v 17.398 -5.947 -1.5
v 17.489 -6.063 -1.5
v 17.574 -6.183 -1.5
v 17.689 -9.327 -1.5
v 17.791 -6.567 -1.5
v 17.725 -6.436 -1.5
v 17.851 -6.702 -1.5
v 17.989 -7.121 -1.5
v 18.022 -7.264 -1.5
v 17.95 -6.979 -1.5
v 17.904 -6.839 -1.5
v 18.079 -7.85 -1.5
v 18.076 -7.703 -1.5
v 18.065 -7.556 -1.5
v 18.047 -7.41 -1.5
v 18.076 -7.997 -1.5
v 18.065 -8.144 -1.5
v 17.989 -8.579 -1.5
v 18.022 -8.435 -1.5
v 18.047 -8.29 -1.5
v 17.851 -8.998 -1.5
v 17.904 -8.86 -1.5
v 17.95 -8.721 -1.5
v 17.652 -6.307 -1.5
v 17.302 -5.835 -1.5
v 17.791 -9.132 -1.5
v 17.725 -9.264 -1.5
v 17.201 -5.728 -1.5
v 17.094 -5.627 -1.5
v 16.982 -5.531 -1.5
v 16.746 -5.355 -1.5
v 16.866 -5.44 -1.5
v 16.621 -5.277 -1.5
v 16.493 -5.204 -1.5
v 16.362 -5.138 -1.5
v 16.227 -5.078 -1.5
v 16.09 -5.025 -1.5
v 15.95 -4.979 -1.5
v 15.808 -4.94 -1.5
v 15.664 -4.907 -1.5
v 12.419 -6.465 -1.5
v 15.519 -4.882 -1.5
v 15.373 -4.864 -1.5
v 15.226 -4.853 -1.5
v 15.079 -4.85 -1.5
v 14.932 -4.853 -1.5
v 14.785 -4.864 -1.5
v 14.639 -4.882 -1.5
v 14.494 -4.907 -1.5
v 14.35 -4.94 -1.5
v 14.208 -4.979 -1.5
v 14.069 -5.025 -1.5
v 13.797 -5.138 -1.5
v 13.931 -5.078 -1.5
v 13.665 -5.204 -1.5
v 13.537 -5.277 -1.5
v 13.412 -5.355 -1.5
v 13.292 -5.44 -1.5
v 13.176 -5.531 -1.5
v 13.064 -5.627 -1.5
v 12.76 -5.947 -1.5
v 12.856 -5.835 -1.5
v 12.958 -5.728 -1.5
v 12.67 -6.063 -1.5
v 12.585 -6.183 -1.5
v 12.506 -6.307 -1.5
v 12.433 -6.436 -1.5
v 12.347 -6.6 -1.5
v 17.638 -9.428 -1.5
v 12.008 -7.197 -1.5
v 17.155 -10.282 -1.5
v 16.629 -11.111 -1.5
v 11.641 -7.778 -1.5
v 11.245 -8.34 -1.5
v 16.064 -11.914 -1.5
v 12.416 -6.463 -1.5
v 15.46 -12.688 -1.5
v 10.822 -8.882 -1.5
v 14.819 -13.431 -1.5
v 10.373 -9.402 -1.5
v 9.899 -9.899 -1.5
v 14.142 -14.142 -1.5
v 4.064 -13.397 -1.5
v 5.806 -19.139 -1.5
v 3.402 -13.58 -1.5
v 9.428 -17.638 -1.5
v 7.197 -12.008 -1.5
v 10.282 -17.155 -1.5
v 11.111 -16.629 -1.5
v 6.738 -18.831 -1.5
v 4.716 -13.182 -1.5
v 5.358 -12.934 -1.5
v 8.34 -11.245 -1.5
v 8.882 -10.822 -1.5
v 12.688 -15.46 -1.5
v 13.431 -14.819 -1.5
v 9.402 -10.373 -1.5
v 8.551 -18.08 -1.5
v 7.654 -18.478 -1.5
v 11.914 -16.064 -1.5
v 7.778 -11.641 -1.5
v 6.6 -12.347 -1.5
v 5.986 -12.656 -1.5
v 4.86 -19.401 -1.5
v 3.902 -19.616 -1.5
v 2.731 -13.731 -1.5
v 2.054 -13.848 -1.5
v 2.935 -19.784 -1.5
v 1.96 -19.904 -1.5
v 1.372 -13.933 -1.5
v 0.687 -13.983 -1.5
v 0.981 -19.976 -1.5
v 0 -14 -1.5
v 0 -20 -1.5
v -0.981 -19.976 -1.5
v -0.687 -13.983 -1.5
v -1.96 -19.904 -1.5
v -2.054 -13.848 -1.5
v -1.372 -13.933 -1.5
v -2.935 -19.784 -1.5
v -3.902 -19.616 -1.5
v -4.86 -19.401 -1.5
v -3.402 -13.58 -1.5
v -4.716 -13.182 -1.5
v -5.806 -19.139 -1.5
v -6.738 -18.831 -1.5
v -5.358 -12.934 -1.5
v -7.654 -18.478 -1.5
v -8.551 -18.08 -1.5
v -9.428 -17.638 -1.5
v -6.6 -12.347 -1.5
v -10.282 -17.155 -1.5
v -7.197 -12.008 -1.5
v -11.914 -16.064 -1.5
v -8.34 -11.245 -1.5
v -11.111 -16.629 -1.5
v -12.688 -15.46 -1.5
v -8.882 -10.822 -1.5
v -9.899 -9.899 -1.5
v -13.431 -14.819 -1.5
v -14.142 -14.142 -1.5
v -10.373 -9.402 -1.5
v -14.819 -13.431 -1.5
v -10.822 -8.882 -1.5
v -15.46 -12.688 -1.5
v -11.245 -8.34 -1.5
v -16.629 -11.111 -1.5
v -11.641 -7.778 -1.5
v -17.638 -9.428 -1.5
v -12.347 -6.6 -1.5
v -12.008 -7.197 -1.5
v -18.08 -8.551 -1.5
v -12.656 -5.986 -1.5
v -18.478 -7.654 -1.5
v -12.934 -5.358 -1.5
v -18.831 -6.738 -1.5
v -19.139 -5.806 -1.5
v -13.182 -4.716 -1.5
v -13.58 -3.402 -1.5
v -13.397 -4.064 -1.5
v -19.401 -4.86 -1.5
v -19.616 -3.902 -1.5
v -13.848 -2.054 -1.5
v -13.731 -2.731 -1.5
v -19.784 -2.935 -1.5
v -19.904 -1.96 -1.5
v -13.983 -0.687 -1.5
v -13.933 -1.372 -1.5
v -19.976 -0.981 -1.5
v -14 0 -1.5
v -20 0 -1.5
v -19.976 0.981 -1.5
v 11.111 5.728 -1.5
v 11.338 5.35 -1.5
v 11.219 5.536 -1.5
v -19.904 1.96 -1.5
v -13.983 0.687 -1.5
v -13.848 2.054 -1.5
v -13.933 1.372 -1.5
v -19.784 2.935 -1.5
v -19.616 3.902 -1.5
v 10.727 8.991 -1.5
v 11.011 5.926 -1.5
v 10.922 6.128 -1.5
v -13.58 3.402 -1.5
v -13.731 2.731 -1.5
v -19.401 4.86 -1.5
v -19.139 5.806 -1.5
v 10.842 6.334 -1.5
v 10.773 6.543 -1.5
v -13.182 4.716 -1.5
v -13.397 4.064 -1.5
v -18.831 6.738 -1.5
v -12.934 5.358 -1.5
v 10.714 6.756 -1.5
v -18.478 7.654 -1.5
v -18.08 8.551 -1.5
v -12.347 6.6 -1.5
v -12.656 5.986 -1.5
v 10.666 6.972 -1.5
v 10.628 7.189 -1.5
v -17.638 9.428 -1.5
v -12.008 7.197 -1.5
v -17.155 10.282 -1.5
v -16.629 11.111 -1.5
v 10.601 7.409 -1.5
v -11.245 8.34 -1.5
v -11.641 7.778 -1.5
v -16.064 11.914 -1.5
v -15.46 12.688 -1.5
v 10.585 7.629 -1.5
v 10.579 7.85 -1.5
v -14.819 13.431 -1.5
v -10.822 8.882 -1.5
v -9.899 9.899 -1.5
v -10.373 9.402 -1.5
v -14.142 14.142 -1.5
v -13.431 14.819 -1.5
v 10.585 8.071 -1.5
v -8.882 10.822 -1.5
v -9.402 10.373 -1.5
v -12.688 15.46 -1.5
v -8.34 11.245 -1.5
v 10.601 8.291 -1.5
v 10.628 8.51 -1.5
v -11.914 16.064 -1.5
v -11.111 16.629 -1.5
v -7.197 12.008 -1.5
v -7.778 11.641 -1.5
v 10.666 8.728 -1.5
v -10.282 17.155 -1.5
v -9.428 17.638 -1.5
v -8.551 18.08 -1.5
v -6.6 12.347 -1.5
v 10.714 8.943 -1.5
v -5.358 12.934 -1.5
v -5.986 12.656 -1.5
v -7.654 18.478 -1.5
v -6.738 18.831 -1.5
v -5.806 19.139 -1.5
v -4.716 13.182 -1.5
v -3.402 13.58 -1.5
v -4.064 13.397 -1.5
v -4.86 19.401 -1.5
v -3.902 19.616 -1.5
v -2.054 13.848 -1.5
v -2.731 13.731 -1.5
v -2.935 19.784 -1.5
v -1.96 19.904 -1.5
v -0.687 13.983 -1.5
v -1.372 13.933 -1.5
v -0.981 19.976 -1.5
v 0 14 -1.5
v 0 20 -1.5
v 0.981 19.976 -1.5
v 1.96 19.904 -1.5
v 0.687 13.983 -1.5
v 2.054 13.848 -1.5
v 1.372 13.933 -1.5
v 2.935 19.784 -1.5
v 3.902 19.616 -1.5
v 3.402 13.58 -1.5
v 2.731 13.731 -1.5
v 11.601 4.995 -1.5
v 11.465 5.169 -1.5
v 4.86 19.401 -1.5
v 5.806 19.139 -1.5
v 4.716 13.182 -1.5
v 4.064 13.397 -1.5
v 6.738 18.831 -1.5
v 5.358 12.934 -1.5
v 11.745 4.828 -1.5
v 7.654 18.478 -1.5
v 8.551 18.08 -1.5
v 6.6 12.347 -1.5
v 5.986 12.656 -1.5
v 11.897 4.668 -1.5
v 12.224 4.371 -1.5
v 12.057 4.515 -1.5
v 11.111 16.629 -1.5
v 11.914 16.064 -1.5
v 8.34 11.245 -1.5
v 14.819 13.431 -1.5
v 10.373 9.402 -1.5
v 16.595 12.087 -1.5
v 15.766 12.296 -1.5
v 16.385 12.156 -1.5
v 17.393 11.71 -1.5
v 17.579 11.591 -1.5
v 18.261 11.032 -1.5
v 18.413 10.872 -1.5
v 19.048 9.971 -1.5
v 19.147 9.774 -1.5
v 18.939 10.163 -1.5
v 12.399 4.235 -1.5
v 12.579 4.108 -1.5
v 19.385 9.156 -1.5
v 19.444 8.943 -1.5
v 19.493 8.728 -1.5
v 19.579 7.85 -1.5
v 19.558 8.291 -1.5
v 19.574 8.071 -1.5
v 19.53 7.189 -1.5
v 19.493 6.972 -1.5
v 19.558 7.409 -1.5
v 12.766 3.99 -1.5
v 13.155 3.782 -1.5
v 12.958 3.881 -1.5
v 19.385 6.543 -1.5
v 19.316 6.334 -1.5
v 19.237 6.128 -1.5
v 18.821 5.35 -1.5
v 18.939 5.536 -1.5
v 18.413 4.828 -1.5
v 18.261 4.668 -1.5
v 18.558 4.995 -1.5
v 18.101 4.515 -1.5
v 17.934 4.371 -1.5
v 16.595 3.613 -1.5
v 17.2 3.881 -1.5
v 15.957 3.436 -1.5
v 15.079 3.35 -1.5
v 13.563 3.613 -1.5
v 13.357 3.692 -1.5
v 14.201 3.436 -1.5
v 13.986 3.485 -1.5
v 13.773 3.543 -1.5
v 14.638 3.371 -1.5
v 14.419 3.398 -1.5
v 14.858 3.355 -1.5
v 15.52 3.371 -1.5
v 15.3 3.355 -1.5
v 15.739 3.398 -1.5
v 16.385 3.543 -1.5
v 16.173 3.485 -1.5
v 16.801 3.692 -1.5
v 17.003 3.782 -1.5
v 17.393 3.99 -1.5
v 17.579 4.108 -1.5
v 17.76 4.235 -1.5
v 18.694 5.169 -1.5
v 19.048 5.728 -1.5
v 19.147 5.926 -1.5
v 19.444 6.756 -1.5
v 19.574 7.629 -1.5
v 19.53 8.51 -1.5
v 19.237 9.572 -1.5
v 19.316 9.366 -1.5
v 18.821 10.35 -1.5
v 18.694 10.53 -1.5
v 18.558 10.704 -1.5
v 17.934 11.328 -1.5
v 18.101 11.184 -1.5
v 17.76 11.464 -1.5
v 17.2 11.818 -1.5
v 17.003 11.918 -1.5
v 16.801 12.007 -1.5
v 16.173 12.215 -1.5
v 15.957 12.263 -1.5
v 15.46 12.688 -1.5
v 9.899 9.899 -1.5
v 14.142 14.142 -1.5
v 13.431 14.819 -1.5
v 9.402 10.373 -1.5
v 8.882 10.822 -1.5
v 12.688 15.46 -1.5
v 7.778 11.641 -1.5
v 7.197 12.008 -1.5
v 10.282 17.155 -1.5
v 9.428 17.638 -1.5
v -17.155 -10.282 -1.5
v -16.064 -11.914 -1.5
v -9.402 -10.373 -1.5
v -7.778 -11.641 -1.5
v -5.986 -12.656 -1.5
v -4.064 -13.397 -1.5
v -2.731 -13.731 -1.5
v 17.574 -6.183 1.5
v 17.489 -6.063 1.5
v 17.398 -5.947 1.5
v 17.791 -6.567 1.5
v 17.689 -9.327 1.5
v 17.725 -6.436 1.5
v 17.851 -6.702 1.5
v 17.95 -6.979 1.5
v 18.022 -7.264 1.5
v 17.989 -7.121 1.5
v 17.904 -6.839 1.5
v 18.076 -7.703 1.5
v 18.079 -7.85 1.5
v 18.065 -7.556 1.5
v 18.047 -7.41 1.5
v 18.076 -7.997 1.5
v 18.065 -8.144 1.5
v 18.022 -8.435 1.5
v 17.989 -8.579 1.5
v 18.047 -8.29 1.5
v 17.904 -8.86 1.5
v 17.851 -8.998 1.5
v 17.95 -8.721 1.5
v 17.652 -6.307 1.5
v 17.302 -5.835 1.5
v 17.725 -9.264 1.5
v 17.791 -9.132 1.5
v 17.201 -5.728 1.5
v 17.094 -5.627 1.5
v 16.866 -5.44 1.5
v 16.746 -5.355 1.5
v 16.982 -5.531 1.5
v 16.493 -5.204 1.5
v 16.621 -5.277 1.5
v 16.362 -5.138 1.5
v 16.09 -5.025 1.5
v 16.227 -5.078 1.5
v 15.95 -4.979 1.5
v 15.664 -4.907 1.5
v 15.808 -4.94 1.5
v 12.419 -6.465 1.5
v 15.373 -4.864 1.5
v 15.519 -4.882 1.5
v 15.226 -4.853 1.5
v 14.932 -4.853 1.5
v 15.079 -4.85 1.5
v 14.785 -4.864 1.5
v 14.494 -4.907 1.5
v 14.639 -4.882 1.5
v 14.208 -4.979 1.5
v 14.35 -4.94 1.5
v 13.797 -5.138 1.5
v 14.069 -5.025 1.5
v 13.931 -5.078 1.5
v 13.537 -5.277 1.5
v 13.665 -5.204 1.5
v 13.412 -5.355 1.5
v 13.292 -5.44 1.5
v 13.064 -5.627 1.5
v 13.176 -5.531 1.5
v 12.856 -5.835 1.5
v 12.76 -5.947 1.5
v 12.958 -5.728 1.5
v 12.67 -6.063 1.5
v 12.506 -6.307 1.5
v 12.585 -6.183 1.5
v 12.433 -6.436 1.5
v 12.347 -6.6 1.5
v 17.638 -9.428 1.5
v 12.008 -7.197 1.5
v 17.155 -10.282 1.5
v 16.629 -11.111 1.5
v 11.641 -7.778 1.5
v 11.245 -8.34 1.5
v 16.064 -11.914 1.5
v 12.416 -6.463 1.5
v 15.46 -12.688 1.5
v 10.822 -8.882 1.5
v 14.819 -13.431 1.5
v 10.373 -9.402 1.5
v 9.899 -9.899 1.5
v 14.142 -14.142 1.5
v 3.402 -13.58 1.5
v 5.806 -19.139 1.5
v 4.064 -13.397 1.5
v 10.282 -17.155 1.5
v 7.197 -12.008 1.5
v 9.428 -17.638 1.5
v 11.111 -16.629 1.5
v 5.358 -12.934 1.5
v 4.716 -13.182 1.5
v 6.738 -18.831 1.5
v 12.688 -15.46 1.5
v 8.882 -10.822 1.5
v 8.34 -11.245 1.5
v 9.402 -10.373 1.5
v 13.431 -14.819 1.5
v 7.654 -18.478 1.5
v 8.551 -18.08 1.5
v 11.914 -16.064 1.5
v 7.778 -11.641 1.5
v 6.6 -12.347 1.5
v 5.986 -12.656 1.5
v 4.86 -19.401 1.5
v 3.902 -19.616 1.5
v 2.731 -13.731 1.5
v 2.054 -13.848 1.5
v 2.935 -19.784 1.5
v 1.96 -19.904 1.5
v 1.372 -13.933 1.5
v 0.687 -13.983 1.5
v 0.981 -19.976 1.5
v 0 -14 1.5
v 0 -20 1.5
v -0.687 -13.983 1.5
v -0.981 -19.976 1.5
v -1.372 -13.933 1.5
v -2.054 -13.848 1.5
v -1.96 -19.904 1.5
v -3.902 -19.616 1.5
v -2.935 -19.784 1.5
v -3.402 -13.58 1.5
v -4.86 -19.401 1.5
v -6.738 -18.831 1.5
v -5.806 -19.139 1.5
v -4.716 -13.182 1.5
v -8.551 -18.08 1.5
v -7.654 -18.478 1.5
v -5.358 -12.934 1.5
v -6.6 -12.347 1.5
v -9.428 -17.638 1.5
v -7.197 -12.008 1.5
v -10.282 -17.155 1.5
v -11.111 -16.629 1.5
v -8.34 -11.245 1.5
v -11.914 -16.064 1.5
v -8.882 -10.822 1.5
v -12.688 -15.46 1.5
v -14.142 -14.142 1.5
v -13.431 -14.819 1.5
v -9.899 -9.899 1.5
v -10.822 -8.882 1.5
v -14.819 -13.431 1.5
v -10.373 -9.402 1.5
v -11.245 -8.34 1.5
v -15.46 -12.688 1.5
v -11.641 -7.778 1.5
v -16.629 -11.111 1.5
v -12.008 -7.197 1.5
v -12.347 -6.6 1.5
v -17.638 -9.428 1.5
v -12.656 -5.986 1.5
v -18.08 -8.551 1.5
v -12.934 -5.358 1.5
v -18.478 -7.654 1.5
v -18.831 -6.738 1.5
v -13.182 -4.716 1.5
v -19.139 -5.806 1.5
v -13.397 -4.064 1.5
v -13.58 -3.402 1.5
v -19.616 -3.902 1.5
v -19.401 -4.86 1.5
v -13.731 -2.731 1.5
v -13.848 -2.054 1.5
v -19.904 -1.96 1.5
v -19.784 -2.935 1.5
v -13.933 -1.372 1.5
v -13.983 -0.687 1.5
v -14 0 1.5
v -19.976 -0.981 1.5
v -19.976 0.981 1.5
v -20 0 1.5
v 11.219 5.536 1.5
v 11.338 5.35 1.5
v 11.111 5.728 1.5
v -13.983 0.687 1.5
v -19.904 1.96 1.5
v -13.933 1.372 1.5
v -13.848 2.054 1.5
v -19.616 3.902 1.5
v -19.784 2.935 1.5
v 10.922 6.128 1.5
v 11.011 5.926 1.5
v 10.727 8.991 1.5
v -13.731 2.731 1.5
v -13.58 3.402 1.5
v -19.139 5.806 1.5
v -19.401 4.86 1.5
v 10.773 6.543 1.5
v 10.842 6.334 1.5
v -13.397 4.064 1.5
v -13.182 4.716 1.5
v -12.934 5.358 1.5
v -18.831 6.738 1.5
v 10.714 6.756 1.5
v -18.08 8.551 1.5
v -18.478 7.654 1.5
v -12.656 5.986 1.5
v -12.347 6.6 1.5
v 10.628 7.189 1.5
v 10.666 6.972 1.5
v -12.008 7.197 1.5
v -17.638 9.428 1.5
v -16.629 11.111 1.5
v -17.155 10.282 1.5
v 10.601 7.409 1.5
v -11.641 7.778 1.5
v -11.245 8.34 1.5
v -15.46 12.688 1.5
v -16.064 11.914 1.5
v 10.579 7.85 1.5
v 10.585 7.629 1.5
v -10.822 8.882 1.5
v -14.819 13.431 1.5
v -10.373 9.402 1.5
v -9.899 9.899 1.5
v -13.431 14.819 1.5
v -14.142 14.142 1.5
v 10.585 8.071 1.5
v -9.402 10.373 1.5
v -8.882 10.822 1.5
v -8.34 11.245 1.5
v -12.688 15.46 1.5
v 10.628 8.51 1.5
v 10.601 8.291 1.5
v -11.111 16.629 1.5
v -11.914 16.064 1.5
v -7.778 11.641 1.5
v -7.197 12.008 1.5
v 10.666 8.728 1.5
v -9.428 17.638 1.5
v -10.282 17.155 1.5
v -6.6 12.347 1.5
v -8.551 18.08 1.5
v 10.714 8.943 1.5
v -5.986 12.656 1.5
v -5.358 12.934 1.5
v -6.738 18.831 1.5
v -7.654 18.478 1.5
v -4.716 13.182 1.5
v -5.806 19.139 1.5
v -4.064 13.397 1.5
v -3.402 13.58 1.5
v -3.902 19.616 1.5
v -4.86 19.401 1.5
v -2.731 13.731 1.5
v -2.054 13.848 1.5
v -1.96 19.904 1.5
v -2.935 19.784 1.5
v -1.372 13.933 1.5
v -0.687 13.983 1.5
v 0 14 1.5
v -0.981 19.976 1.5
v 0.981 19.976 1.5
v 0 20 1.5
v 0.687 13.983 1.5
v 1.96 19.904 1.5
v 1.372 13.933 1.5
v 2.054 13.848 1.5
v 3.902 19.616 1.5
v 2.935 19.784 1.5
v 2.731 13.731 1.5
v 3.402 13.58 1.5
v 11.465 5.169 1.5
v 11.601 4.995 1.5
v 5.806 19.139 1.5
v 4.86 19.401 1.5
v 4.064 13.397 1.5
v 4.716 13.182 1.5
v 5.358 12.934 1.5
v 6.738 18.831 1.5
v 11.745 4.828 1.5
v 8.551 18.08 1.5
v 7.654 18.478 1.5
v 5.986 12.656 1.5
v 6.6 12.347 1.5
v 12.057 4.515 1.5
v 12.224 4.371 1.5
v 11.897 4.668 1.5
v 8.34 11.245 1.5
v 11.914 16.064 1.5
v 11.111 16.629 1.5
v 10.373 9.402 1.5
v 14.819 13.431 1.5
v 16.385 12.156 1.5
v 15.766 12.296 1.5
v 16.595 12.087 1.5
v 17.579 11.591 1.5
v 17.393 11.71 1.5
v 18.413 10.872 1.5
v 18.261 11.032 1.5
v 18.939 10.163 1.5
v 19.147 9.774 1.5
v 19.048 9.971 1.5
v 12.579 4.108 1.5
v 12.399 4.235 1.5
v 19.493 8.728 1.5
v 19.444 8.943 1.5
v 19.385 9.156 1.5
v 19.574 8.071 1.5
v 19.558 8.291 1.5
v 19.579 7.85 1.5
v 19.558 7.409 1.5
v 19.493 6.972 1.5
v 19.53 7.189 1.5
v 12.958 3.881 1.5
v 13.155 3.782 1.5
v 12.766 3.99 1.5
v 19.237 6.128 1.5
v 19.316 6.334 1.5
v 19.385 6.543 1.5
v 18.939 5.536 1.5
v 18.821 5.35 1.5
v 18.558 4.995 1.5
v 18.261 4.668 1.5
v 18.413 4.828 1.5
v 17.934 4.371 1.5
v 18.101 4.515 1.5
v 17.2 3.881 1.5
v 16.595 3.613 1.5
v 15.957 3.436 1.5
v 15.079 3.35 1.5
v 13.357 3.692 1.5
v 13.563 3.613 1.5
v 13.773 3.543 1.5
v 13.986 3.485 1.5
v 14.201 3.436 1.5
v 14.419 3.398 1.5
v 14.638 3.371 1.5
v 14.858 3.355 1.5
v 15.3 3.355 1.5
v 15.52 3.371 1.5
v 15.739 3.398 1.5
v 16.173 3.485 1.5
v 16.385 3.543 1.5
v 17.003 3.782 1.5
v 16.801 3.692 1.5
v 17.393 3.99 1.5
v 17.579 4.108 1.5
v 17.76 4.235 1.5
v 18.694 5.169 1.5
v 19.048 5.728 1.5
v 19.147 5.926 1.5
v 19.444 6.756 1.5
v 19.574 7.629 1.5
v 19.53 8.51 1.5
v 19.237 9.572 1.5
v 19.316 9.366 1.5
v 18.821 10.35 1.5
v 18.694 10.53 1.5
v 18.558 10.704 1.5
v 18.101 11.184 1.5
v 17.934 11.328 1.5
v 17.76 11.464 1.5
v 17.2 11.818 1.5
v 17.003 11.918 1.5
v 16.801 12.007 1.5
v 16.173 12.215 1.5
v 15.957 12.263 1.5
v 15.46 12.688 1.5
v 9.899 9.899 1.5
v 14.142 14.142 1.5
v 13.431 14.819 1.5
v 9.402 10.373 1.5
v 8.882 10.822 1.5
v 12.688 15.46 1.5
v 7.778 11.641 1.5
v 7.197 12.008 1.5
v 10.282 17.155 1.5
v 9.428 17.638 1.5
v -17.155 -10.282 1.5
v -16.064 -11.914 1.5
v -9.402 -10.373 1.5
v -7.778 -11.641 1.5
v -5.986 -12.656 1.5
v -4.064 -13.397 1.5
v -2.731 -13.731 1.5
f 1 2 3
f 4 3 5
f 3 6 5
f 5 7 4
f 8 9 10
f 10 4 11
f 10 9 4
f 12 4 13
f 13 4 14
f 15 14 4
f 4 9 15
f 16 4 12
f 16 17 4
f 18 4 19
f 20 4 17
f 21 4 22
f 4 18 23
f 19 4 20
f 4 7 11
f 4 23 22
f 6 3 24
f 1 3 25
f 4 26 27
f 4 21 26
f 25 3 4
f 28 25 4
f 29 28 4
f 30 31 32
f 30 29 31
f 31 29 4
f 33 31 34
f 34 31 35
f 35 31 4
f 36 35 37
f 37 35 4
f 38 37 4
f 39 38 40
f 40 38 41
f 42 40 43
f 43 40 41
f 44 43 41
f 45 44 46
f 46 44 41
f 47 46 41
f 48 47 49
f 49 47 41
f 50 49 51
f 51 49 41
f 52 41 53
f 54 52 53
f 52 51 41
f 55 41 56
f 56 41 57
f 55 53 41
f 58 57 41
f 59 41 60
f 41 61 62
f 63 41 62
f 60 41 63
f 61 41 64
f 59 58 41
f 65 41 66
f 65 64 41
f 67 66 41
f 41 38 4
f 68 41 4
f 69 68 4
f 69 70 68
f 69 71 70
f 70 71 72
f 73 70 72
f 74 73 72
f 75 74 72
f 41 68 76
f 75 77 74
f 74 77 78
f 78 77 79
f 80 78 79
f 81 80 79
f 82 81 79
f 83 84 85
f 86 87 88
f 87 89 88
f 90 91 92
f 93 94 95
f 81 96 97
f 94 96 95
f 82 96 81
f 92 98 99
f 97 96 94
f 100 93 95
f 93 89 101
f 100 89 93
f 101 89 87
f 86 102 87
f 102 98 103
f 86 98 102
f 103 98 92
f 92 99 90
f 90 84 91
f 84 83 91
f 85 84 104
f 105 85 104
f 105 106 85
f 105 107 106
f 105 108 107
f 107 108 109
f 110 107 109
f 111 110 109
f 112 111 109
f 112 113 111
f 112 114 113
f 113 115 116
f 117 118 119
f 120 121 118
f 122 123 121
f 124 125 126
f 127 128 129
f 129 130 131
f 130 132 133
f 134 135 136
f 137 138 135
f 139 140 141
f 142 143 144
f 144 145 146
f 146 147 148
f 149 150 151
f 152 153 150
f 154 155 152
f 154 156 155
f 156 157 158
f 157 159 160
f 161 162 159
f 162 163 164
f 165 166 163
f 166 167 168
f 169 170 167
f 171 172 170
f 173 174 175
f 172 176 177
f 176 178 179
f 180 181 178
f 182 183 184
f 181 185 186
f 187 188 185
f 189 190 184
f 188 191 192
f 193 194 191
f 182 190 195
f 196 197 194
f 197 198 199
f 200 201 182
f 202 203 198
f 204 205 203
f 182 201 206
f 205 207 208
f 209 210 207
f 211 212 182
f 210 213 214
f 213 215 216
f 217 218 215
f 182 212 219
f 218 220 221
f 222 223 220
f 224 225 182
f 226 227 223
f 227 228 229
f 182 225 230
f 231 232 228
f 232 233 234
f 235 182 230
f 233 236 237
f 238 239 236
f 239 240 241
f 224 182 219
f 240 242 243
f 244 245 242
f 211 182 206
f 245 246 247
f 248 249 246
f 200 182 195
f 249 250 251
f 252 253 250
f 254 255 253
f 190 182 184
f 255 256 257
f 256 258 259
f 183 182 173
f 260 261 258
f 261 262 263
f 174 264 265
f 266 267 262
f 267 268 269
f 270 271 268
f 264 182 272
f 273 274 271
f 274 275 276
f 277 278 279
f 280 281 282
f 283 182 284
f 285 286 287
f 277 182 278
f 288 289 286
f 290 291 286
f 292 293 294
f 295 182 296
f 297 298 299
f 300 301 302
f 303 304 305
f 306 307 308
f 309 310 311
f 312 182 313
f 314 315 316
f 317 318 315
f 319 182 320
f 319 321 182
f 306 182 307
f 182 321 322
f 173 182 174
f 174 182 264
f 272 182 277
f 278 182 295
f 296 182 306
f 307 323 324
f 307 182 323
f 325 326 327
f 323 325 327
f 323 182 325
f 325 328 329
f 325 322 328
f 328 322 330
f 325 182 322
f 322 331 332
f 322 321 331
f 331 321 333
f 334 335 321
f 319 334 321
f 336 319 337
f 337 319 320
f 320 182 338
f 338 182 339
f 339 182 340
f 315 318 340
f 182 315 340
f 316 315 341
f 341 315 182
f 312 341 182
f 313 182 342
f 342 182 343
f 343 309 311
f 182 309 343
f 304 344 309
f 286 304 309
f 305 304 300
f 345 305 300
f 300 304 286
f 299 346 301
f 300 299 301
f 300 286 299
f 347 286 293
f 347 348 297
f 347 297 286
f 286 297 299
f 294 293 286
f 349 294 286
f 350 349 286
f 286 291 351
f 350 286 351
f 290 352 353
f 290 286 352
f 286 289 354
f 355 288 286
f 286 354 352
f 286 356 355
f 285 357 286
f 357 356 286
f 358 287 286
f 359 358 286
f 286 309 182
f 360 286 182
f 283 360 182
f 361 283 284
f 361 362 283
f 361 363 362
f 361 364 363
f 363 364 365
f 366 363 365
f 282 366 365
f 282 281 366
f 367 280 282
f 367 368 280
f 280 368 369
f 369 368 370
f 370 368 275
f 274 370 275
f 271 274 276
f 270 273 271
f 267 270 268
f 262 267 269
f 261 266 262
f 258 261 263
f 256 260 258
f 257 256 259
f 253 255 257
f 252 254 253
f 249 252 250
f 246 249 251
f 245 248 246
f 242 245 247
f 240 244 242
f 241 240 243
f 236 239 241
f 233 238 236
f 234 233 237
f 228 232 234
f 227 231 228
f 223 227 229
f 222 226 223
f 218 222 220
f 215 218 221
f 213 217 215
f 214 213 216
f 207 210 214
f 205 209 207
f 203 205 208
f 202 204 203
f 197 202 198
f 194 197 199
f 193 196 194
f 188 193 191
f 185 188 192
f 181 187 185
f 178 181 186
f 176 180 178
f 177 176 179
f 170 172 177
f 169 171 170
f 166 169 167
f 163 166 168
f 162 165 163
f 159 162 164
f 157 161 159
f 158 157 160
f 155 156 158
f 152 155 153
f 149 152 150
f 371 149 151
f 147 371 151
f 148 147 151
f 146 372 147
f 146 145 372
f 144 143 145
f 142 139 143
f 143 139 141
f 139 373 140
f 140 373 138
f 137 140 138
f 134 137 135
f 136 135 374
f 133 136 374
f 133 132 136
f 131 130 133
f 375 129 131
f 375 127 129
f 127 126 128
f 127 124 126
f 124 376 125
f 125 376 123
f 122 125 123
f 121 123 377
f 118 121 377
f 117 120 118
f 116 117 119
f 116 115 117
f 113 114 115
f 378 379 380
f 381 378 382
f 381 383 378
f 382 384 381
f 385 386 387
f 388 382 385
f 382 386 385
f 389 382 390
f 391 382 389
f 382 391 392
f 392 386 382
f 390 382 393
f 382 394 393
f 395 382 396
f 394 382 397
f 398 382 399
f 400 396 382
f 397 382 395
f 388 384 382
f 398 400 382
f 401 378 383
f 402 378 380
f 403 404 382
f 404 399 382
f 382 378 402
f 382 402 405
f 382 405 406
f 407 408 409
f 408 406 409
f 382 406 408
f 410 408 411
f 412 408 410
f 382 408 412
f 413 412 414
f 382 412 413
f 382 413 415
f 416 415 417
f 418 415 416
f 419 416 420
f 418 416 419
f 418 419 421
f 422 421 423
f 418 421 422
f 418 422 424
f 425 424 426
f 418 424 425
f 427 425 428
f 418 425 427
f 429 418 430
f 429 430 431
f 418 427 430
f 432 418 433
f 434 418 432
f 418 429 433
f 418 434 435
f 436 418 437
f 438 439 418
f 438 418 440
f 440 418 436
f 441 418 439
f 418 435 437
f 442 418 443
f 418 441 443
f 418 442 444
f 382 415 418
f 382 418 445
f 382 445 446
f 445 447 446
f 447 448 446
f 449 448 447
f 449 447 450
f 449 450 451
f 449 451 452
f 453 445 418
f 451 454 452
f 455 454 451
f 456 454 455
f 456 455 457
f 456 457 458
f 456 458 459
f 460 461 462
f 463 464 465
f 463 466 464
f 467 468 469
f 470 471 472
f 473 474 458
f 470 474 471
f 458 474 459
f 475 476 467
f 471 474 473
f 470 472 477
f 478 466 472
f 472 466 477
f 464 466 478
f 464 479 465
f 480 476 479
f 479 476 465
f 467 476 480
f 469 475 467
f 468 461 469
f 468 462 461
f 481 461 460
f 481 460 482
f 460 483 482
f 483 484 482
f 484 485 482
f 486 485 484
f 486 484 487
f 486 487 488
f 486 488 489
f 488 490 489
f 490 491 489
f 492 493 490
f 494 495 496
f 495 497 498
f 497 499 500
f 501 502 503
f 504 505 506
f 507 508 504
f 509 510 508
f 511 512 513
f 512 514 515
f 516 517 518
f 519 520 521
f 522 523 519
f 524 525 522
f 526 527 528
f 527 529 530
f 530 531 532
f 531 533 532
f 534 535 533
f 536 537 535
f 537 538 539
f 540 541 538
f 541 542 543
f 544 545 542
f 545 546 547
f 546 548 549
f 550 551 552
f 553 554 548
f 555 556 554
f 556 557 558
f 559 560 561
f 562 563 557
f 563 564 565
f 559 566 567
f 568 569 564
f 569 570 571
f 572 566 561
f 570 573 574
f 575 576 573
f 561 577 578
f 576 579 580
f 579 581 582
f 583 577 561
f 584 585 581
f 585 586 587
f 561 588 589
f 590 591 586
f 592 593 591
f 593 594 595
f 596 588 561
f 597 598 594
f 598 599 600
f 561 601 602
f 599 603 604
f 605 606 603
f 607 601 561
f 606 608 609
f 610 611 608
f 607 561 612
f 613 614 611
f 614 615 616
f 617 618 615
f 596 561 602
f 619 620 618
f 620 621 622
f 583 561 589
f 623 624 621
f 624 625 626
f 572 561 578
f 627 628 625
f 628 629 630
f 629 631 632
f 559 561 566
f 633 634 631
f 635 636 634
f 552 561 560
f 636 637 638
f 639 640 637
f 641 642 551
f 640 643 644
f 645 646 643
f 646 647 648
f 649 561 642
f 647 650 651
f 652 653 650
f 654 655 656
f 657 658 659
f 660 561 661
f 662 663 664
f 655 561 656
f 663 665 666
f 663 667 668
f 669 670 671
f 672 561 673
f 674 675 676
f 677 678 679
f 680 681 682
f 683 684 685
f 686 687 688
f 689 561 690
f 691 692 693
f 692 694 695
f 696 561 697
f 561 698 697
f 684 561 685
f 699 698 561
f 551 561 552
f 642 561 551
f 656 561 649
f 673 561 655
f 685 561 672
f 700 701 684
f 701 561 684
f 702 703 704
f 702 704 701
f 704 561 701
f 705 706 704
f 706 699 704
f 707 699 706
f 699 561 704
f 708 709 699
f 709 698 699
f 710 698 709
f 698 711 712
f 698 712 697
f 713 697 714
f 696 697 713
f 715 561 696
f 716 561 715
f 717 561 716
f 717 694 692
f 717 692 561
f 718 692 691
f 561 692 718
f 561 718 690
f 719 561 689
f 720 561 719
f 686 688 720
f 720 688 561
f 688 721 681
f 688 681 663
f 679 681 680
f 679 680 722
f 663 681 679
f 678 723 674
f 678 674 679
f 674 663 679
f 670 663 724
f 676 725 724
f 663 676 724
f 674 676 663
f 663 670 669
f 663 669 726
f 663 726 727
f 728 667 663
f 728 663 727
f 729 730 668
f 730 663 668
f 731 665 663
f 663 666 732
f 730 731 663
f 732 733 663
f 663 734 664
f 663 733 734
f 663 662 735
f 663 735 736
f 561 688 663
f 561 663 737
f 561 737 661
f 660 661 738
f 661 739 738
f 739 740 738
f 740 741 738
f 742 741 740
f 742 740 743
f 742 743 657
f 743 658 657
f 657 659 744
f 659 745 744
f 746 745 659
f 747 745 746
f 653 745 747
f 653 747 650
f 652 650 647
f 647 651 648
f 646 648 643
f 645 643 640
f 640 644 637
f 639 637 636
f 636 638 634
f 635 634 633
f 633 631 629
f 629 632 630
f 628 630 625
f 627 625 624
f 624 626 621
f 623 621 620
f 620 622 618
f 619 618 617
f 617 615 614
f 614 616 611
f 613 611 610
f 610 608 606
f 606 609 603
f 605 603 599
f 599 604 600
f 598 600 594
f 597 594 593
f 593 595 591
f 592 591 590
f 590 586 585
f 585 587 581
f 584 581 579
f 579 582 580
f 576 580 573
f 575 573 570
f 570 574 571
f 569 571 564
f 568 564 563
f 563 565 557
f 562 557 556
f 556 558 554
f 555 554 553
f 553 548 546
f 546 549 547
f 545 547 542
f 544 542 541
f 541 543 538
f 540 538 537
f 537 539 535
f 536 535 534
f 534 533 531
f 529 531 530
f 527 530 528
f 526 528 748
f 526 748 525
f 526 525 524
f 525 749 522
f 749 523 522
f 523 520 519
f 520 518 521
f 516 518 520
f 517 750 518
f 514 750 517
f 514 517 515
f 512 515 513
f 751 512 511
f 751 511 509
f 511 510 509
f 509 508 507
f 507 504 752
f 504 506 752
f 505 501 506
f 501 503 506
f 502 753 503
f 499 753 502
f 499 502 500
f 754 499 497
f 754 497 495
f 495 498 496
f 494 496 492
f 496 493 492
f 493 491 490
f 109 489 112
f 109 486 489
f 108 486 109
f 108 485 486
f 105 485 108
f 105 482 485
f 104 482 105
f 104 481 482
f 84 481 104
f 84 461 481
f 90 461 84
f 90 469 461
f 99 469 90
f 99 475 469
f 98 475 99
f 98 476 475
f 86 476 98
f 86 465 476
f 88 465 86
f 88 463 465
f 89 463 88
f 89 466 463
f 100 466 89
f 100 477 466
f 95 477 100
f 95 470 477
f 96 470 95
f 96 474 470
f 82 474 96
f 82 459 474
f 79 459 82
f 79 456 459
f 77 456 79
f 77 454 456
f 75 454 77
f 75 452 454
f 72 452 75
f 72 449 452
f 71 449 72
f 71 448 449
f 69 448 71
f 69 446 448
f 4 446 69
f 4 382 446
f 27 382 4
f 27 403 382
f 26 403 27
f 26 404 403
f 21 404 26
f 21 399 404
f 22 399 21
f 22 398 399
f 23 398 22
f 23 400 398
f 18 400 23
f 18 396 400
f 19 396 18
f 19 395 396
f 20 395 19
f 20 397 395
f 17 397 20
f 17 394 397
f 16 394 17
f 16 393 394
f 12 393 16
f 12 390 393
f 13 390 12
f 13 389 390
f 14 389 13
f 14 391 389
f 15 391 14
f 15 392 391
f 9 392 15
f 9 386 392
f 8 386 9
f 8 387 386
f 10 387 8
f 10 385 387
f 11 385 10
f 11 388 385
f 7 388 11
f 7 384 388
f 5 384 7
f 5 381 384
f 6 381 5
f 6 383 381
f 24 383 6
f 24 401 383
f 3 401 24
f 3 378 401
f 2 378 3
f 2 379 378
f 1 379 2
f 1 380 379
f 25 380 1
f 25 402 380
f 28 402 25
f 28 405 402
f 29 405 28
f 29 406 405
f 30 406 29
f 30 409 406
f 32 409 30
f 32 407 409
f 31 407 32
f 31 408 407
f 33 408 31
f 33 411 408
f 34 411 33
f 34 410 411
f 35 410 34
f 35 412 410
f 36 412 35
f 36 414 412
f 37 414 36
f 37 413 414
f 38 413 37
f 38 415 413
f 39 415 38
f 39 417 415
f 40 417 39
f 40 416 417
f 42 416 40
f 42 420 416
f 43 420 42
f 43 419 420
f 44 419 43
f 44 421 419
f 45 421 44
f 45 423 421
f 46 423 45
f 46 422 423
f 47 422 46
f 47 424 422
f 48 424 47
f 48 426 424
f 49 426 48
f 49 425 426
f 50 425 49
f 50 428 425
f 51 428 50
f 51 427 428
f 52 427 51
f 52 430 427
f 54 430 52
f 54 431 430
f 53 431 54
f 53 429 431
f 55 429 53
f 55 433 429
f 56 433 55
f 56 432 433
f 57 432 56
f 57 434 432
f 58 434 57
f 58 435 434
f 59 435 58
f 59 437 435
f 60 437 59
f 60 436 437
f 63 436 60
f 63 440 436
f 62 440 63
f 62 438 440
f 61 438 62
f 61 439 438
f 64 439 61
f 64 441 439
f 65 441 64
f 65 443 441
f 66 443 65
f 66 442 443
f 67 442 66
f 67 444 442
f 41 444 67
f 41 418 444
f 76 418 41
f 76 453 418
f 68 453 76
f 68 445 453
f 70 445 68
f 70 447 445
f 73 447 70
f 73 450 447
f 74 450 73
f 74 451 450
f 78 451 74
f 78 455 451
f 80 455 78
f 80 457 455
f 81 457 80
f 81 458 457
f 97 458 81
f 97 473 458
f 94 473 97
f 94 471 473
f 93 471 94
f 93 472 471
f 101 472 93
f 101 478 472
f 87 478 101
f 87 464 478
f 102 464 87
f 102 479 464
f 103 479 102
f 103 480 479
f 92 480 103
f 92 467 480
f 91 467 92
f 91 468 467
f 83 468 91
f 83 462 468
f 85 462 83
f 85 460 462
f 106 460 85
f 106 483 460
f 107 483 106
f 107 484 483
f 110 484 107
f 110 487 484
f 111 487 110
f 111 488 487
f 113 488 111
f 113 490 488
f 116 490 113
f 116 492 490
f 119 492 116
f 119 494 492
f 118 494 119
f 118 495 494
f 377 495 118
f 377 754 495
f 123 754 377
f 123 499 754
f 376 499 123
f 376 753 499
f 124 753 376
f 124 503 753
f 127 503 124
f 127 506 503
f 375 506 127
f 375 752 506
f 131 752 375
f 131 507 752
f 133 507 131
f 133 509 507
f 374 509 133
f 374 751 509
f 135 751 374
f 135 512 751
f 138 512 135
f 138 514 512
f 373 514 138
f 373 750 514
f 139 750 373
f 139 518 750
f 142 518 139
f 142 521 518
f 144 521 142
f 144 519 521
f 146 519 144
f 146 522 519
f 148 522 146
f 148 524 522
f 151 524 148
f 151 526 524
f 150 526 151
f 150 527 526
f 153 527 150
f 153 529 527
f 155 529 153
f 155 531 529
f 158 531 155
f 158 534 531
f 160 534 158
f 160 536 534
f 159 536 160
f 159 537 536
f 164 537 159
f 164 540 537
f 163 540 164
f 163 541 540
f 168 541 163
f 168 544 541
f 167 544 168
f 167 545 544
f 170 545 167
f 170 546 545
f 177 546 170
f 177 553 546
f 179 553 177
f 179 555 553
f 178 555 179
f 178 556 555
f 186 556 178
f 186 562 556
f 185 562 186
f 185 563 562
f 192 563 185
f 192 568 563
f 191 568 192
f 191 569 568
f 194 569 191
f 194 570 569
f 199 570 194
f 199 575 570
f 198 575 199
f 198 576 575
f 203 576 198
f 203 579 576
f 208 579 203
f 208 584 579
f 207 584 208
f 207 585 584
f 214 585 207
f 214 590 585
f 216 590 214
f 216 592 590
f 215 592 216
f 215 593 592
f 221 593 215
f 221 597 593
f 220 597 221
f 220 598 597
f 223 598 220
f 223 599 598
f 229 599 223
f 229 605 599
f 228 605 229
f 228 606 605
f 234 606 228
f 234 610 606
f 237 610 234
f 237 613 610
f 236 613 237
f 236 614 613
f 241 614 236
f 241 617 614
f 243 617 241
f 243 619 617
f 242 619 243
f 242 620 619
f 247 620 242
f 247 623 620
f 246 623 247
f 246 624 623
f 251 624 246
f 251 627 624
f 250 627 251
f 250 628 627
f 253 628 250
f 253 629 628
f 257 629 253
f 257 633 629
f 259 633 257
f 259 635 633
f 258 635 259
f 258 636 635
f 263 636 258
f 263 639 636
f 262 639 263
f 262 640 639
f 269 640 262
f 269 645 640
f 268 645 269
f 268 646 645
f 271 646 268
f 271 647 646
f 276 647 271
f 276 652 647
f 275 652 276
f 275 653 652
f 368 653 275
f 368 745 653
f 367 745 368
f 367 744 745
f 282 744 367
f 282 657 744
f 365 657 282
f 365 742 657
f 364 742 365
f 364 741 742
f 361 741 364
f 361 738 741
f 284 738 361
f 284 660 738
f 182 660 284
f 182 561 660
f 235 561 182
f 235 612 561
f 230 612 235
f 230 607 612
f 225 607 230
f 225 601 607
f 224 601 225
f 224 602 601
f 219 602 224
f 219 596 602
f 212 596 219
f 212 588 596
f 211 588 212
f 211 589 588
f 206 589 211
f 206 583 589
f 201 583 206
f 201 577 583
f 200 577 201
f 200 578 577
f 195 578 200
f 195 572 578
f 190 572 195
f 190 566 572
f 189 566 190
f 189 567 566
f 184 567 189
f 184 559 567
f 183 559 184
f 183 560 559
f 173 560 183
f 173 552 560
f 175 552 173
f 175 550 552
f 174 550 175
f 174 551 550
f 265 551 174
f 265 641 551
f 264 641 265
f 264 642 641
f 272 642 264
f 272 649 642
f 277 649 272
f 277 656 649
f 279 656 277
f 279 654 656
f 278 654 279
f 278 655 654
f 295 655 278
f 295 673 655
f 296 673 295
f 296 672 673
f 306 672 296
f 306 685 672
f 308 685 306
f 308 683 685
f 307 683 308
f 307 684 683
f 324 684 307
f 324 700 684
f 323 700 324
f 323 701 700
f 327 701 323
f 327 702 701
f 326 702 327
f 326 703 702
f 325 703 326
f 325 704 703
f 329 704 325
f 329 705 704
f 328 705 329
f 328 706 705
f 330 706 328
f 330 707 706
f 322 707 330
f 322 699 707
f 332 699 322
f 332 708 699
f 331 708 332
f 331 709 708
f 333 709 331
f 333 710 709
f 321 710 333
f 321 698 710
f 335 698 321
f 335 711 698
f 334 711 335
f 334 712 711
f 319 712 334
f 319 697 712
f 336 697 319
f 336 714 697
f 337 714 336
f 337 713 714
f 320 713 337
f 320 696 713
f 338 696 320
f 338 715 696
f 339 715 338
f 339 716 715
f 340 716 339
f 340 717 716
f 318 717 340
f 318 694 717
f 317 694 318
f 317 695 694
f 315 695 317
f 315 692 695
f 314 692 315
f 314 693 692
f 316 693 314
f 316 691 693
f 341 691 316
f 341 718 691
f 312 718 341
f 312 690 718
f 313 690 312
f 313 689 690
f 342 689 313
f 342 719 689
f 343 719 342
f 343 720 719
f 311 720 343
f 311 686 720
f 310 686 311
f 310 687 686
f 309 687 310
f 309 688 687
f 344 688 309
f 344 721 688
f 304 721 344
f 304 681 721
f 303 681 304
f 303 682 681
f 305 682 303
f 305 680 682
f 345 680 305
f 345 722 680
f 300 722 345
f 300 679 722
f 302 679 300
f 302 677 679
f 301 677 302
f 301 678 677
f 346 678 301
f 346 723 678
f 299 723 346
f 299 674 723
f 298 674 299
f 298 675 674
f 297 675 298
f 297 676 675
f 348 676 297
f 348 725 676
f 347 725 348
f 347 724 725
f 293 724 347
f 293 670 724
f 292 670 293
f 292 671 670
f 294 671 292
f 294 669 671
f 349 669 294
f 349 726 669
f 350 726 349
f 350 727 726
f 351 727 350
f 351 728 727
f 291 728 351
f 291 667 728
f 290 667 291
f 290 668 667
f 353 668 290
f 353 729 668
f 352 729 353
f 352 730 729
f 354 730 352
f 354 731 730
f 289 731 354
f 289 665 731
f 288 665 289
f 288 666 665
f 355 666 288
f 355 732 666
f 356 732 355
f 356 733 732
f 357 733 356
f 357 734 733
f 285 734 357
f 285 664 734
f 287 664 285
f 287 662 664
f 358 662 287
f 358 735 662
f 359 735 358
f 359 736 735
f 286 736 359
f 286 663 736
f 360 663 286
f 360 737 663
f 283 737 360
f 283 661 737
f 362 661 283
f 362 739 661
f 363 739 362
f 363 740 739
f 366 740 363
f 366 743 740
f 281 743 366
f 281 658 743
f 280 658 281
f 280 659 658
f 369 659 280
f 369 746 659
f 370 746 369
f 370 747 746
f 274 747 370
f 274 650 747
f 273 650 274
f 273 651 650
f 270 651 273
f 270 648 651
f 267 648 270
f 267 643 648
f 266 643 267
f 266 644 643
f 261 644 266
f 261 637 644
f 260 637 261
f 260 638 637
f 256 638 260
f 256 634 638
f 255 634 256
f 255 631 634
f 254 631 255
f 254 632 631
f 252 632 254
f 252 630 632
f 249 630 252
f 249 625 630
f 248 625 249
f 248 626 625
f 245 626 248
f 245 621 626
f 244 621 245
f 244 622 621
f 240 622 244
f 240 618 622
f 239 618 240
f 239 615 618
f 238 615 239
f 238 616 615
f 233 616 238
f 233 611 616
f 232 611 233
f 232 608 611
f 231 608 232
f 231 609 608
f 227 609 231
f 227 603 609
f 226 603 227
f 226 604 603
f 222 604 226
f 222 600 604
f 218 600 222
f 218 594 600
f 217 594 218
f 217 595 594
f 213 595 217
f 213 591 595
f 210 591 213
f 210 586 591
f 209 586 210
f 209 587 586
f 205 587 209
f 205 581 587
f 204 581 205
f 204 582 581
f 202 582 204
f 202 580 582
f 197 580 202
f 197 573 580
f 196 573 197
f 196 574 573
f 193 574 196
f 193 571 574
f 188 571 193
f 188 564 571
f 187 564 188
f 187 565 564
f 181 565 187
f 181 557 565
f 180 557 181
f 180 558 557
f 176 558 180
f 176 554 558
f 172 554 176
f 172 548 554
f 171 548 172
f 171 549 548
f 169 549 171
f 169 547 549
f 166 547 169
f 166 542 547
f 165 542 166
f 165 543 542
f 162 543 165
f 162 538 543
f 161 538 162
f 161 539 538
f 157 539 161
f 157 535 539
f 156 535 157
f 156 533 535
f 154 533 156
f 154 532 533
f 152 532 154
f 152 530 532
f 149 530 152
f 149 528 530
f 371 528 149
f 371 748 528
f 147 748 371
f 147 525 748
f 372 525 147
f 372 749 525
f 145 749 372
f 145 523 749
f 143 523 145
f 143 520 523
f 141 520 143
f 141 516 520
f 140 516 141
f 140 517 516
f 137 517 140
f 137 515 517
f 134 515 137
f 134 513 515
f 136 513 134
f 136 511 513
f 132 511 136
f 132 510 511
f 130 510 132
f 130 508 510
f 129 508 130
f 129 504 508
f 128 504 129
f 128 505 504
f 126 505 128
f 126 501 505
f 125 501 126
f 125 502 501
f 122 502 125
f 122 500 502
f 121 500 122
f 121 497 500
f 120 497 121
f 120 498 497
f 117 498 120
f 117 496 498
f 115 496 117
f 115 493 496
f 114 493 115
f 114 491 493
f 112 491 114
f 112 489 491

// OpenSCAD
$fn=128;

outer_r = 20;
band_w = 6;
inner_r = outer_r - band_w;

thk = 3;

gap_deg = 55;
start_deg = gap_deg/2;
end_deg = 360 - gap_deg/2;

end_round_r = band_w/2;
bulb_r = band_w*0.75;

module ring_band_2d(){
    difference(){
        circle(r=outer_r);
        circle(r=inner_r);
    }
}

module sector_mask_2d(a1, a2, r){
    polygon(points=concat([[0,0]],
        [for (a=[a1:1:a2]) [r*cos(a), r*sin(a)]],
        [[r*cos(a2), r*sin(a2)]]
    ));
}

module c_clip_2d(){
    union(){
        intersection(){
            ring_band_2d();
            sector_mask_2d(start_deg, end_deg, outer_r+band_w*2);
        }
        for (a=[start_deg, end_deg]){
            translate([ (outer_r - band_w/2)*cos(a), (outer_r - band_w/2)*sin(a) ])
                circle(r=end_round_r);
        }
        translate([ (outer_r - band_w/2)*cos(start_deg), (outer_r - band_w/2)*sin(start_deg) ])
            circle(r=bulb_r);
    }
}

linear_extrude(height=thk, center=true, convexity=10)
    c_clip_2d();
